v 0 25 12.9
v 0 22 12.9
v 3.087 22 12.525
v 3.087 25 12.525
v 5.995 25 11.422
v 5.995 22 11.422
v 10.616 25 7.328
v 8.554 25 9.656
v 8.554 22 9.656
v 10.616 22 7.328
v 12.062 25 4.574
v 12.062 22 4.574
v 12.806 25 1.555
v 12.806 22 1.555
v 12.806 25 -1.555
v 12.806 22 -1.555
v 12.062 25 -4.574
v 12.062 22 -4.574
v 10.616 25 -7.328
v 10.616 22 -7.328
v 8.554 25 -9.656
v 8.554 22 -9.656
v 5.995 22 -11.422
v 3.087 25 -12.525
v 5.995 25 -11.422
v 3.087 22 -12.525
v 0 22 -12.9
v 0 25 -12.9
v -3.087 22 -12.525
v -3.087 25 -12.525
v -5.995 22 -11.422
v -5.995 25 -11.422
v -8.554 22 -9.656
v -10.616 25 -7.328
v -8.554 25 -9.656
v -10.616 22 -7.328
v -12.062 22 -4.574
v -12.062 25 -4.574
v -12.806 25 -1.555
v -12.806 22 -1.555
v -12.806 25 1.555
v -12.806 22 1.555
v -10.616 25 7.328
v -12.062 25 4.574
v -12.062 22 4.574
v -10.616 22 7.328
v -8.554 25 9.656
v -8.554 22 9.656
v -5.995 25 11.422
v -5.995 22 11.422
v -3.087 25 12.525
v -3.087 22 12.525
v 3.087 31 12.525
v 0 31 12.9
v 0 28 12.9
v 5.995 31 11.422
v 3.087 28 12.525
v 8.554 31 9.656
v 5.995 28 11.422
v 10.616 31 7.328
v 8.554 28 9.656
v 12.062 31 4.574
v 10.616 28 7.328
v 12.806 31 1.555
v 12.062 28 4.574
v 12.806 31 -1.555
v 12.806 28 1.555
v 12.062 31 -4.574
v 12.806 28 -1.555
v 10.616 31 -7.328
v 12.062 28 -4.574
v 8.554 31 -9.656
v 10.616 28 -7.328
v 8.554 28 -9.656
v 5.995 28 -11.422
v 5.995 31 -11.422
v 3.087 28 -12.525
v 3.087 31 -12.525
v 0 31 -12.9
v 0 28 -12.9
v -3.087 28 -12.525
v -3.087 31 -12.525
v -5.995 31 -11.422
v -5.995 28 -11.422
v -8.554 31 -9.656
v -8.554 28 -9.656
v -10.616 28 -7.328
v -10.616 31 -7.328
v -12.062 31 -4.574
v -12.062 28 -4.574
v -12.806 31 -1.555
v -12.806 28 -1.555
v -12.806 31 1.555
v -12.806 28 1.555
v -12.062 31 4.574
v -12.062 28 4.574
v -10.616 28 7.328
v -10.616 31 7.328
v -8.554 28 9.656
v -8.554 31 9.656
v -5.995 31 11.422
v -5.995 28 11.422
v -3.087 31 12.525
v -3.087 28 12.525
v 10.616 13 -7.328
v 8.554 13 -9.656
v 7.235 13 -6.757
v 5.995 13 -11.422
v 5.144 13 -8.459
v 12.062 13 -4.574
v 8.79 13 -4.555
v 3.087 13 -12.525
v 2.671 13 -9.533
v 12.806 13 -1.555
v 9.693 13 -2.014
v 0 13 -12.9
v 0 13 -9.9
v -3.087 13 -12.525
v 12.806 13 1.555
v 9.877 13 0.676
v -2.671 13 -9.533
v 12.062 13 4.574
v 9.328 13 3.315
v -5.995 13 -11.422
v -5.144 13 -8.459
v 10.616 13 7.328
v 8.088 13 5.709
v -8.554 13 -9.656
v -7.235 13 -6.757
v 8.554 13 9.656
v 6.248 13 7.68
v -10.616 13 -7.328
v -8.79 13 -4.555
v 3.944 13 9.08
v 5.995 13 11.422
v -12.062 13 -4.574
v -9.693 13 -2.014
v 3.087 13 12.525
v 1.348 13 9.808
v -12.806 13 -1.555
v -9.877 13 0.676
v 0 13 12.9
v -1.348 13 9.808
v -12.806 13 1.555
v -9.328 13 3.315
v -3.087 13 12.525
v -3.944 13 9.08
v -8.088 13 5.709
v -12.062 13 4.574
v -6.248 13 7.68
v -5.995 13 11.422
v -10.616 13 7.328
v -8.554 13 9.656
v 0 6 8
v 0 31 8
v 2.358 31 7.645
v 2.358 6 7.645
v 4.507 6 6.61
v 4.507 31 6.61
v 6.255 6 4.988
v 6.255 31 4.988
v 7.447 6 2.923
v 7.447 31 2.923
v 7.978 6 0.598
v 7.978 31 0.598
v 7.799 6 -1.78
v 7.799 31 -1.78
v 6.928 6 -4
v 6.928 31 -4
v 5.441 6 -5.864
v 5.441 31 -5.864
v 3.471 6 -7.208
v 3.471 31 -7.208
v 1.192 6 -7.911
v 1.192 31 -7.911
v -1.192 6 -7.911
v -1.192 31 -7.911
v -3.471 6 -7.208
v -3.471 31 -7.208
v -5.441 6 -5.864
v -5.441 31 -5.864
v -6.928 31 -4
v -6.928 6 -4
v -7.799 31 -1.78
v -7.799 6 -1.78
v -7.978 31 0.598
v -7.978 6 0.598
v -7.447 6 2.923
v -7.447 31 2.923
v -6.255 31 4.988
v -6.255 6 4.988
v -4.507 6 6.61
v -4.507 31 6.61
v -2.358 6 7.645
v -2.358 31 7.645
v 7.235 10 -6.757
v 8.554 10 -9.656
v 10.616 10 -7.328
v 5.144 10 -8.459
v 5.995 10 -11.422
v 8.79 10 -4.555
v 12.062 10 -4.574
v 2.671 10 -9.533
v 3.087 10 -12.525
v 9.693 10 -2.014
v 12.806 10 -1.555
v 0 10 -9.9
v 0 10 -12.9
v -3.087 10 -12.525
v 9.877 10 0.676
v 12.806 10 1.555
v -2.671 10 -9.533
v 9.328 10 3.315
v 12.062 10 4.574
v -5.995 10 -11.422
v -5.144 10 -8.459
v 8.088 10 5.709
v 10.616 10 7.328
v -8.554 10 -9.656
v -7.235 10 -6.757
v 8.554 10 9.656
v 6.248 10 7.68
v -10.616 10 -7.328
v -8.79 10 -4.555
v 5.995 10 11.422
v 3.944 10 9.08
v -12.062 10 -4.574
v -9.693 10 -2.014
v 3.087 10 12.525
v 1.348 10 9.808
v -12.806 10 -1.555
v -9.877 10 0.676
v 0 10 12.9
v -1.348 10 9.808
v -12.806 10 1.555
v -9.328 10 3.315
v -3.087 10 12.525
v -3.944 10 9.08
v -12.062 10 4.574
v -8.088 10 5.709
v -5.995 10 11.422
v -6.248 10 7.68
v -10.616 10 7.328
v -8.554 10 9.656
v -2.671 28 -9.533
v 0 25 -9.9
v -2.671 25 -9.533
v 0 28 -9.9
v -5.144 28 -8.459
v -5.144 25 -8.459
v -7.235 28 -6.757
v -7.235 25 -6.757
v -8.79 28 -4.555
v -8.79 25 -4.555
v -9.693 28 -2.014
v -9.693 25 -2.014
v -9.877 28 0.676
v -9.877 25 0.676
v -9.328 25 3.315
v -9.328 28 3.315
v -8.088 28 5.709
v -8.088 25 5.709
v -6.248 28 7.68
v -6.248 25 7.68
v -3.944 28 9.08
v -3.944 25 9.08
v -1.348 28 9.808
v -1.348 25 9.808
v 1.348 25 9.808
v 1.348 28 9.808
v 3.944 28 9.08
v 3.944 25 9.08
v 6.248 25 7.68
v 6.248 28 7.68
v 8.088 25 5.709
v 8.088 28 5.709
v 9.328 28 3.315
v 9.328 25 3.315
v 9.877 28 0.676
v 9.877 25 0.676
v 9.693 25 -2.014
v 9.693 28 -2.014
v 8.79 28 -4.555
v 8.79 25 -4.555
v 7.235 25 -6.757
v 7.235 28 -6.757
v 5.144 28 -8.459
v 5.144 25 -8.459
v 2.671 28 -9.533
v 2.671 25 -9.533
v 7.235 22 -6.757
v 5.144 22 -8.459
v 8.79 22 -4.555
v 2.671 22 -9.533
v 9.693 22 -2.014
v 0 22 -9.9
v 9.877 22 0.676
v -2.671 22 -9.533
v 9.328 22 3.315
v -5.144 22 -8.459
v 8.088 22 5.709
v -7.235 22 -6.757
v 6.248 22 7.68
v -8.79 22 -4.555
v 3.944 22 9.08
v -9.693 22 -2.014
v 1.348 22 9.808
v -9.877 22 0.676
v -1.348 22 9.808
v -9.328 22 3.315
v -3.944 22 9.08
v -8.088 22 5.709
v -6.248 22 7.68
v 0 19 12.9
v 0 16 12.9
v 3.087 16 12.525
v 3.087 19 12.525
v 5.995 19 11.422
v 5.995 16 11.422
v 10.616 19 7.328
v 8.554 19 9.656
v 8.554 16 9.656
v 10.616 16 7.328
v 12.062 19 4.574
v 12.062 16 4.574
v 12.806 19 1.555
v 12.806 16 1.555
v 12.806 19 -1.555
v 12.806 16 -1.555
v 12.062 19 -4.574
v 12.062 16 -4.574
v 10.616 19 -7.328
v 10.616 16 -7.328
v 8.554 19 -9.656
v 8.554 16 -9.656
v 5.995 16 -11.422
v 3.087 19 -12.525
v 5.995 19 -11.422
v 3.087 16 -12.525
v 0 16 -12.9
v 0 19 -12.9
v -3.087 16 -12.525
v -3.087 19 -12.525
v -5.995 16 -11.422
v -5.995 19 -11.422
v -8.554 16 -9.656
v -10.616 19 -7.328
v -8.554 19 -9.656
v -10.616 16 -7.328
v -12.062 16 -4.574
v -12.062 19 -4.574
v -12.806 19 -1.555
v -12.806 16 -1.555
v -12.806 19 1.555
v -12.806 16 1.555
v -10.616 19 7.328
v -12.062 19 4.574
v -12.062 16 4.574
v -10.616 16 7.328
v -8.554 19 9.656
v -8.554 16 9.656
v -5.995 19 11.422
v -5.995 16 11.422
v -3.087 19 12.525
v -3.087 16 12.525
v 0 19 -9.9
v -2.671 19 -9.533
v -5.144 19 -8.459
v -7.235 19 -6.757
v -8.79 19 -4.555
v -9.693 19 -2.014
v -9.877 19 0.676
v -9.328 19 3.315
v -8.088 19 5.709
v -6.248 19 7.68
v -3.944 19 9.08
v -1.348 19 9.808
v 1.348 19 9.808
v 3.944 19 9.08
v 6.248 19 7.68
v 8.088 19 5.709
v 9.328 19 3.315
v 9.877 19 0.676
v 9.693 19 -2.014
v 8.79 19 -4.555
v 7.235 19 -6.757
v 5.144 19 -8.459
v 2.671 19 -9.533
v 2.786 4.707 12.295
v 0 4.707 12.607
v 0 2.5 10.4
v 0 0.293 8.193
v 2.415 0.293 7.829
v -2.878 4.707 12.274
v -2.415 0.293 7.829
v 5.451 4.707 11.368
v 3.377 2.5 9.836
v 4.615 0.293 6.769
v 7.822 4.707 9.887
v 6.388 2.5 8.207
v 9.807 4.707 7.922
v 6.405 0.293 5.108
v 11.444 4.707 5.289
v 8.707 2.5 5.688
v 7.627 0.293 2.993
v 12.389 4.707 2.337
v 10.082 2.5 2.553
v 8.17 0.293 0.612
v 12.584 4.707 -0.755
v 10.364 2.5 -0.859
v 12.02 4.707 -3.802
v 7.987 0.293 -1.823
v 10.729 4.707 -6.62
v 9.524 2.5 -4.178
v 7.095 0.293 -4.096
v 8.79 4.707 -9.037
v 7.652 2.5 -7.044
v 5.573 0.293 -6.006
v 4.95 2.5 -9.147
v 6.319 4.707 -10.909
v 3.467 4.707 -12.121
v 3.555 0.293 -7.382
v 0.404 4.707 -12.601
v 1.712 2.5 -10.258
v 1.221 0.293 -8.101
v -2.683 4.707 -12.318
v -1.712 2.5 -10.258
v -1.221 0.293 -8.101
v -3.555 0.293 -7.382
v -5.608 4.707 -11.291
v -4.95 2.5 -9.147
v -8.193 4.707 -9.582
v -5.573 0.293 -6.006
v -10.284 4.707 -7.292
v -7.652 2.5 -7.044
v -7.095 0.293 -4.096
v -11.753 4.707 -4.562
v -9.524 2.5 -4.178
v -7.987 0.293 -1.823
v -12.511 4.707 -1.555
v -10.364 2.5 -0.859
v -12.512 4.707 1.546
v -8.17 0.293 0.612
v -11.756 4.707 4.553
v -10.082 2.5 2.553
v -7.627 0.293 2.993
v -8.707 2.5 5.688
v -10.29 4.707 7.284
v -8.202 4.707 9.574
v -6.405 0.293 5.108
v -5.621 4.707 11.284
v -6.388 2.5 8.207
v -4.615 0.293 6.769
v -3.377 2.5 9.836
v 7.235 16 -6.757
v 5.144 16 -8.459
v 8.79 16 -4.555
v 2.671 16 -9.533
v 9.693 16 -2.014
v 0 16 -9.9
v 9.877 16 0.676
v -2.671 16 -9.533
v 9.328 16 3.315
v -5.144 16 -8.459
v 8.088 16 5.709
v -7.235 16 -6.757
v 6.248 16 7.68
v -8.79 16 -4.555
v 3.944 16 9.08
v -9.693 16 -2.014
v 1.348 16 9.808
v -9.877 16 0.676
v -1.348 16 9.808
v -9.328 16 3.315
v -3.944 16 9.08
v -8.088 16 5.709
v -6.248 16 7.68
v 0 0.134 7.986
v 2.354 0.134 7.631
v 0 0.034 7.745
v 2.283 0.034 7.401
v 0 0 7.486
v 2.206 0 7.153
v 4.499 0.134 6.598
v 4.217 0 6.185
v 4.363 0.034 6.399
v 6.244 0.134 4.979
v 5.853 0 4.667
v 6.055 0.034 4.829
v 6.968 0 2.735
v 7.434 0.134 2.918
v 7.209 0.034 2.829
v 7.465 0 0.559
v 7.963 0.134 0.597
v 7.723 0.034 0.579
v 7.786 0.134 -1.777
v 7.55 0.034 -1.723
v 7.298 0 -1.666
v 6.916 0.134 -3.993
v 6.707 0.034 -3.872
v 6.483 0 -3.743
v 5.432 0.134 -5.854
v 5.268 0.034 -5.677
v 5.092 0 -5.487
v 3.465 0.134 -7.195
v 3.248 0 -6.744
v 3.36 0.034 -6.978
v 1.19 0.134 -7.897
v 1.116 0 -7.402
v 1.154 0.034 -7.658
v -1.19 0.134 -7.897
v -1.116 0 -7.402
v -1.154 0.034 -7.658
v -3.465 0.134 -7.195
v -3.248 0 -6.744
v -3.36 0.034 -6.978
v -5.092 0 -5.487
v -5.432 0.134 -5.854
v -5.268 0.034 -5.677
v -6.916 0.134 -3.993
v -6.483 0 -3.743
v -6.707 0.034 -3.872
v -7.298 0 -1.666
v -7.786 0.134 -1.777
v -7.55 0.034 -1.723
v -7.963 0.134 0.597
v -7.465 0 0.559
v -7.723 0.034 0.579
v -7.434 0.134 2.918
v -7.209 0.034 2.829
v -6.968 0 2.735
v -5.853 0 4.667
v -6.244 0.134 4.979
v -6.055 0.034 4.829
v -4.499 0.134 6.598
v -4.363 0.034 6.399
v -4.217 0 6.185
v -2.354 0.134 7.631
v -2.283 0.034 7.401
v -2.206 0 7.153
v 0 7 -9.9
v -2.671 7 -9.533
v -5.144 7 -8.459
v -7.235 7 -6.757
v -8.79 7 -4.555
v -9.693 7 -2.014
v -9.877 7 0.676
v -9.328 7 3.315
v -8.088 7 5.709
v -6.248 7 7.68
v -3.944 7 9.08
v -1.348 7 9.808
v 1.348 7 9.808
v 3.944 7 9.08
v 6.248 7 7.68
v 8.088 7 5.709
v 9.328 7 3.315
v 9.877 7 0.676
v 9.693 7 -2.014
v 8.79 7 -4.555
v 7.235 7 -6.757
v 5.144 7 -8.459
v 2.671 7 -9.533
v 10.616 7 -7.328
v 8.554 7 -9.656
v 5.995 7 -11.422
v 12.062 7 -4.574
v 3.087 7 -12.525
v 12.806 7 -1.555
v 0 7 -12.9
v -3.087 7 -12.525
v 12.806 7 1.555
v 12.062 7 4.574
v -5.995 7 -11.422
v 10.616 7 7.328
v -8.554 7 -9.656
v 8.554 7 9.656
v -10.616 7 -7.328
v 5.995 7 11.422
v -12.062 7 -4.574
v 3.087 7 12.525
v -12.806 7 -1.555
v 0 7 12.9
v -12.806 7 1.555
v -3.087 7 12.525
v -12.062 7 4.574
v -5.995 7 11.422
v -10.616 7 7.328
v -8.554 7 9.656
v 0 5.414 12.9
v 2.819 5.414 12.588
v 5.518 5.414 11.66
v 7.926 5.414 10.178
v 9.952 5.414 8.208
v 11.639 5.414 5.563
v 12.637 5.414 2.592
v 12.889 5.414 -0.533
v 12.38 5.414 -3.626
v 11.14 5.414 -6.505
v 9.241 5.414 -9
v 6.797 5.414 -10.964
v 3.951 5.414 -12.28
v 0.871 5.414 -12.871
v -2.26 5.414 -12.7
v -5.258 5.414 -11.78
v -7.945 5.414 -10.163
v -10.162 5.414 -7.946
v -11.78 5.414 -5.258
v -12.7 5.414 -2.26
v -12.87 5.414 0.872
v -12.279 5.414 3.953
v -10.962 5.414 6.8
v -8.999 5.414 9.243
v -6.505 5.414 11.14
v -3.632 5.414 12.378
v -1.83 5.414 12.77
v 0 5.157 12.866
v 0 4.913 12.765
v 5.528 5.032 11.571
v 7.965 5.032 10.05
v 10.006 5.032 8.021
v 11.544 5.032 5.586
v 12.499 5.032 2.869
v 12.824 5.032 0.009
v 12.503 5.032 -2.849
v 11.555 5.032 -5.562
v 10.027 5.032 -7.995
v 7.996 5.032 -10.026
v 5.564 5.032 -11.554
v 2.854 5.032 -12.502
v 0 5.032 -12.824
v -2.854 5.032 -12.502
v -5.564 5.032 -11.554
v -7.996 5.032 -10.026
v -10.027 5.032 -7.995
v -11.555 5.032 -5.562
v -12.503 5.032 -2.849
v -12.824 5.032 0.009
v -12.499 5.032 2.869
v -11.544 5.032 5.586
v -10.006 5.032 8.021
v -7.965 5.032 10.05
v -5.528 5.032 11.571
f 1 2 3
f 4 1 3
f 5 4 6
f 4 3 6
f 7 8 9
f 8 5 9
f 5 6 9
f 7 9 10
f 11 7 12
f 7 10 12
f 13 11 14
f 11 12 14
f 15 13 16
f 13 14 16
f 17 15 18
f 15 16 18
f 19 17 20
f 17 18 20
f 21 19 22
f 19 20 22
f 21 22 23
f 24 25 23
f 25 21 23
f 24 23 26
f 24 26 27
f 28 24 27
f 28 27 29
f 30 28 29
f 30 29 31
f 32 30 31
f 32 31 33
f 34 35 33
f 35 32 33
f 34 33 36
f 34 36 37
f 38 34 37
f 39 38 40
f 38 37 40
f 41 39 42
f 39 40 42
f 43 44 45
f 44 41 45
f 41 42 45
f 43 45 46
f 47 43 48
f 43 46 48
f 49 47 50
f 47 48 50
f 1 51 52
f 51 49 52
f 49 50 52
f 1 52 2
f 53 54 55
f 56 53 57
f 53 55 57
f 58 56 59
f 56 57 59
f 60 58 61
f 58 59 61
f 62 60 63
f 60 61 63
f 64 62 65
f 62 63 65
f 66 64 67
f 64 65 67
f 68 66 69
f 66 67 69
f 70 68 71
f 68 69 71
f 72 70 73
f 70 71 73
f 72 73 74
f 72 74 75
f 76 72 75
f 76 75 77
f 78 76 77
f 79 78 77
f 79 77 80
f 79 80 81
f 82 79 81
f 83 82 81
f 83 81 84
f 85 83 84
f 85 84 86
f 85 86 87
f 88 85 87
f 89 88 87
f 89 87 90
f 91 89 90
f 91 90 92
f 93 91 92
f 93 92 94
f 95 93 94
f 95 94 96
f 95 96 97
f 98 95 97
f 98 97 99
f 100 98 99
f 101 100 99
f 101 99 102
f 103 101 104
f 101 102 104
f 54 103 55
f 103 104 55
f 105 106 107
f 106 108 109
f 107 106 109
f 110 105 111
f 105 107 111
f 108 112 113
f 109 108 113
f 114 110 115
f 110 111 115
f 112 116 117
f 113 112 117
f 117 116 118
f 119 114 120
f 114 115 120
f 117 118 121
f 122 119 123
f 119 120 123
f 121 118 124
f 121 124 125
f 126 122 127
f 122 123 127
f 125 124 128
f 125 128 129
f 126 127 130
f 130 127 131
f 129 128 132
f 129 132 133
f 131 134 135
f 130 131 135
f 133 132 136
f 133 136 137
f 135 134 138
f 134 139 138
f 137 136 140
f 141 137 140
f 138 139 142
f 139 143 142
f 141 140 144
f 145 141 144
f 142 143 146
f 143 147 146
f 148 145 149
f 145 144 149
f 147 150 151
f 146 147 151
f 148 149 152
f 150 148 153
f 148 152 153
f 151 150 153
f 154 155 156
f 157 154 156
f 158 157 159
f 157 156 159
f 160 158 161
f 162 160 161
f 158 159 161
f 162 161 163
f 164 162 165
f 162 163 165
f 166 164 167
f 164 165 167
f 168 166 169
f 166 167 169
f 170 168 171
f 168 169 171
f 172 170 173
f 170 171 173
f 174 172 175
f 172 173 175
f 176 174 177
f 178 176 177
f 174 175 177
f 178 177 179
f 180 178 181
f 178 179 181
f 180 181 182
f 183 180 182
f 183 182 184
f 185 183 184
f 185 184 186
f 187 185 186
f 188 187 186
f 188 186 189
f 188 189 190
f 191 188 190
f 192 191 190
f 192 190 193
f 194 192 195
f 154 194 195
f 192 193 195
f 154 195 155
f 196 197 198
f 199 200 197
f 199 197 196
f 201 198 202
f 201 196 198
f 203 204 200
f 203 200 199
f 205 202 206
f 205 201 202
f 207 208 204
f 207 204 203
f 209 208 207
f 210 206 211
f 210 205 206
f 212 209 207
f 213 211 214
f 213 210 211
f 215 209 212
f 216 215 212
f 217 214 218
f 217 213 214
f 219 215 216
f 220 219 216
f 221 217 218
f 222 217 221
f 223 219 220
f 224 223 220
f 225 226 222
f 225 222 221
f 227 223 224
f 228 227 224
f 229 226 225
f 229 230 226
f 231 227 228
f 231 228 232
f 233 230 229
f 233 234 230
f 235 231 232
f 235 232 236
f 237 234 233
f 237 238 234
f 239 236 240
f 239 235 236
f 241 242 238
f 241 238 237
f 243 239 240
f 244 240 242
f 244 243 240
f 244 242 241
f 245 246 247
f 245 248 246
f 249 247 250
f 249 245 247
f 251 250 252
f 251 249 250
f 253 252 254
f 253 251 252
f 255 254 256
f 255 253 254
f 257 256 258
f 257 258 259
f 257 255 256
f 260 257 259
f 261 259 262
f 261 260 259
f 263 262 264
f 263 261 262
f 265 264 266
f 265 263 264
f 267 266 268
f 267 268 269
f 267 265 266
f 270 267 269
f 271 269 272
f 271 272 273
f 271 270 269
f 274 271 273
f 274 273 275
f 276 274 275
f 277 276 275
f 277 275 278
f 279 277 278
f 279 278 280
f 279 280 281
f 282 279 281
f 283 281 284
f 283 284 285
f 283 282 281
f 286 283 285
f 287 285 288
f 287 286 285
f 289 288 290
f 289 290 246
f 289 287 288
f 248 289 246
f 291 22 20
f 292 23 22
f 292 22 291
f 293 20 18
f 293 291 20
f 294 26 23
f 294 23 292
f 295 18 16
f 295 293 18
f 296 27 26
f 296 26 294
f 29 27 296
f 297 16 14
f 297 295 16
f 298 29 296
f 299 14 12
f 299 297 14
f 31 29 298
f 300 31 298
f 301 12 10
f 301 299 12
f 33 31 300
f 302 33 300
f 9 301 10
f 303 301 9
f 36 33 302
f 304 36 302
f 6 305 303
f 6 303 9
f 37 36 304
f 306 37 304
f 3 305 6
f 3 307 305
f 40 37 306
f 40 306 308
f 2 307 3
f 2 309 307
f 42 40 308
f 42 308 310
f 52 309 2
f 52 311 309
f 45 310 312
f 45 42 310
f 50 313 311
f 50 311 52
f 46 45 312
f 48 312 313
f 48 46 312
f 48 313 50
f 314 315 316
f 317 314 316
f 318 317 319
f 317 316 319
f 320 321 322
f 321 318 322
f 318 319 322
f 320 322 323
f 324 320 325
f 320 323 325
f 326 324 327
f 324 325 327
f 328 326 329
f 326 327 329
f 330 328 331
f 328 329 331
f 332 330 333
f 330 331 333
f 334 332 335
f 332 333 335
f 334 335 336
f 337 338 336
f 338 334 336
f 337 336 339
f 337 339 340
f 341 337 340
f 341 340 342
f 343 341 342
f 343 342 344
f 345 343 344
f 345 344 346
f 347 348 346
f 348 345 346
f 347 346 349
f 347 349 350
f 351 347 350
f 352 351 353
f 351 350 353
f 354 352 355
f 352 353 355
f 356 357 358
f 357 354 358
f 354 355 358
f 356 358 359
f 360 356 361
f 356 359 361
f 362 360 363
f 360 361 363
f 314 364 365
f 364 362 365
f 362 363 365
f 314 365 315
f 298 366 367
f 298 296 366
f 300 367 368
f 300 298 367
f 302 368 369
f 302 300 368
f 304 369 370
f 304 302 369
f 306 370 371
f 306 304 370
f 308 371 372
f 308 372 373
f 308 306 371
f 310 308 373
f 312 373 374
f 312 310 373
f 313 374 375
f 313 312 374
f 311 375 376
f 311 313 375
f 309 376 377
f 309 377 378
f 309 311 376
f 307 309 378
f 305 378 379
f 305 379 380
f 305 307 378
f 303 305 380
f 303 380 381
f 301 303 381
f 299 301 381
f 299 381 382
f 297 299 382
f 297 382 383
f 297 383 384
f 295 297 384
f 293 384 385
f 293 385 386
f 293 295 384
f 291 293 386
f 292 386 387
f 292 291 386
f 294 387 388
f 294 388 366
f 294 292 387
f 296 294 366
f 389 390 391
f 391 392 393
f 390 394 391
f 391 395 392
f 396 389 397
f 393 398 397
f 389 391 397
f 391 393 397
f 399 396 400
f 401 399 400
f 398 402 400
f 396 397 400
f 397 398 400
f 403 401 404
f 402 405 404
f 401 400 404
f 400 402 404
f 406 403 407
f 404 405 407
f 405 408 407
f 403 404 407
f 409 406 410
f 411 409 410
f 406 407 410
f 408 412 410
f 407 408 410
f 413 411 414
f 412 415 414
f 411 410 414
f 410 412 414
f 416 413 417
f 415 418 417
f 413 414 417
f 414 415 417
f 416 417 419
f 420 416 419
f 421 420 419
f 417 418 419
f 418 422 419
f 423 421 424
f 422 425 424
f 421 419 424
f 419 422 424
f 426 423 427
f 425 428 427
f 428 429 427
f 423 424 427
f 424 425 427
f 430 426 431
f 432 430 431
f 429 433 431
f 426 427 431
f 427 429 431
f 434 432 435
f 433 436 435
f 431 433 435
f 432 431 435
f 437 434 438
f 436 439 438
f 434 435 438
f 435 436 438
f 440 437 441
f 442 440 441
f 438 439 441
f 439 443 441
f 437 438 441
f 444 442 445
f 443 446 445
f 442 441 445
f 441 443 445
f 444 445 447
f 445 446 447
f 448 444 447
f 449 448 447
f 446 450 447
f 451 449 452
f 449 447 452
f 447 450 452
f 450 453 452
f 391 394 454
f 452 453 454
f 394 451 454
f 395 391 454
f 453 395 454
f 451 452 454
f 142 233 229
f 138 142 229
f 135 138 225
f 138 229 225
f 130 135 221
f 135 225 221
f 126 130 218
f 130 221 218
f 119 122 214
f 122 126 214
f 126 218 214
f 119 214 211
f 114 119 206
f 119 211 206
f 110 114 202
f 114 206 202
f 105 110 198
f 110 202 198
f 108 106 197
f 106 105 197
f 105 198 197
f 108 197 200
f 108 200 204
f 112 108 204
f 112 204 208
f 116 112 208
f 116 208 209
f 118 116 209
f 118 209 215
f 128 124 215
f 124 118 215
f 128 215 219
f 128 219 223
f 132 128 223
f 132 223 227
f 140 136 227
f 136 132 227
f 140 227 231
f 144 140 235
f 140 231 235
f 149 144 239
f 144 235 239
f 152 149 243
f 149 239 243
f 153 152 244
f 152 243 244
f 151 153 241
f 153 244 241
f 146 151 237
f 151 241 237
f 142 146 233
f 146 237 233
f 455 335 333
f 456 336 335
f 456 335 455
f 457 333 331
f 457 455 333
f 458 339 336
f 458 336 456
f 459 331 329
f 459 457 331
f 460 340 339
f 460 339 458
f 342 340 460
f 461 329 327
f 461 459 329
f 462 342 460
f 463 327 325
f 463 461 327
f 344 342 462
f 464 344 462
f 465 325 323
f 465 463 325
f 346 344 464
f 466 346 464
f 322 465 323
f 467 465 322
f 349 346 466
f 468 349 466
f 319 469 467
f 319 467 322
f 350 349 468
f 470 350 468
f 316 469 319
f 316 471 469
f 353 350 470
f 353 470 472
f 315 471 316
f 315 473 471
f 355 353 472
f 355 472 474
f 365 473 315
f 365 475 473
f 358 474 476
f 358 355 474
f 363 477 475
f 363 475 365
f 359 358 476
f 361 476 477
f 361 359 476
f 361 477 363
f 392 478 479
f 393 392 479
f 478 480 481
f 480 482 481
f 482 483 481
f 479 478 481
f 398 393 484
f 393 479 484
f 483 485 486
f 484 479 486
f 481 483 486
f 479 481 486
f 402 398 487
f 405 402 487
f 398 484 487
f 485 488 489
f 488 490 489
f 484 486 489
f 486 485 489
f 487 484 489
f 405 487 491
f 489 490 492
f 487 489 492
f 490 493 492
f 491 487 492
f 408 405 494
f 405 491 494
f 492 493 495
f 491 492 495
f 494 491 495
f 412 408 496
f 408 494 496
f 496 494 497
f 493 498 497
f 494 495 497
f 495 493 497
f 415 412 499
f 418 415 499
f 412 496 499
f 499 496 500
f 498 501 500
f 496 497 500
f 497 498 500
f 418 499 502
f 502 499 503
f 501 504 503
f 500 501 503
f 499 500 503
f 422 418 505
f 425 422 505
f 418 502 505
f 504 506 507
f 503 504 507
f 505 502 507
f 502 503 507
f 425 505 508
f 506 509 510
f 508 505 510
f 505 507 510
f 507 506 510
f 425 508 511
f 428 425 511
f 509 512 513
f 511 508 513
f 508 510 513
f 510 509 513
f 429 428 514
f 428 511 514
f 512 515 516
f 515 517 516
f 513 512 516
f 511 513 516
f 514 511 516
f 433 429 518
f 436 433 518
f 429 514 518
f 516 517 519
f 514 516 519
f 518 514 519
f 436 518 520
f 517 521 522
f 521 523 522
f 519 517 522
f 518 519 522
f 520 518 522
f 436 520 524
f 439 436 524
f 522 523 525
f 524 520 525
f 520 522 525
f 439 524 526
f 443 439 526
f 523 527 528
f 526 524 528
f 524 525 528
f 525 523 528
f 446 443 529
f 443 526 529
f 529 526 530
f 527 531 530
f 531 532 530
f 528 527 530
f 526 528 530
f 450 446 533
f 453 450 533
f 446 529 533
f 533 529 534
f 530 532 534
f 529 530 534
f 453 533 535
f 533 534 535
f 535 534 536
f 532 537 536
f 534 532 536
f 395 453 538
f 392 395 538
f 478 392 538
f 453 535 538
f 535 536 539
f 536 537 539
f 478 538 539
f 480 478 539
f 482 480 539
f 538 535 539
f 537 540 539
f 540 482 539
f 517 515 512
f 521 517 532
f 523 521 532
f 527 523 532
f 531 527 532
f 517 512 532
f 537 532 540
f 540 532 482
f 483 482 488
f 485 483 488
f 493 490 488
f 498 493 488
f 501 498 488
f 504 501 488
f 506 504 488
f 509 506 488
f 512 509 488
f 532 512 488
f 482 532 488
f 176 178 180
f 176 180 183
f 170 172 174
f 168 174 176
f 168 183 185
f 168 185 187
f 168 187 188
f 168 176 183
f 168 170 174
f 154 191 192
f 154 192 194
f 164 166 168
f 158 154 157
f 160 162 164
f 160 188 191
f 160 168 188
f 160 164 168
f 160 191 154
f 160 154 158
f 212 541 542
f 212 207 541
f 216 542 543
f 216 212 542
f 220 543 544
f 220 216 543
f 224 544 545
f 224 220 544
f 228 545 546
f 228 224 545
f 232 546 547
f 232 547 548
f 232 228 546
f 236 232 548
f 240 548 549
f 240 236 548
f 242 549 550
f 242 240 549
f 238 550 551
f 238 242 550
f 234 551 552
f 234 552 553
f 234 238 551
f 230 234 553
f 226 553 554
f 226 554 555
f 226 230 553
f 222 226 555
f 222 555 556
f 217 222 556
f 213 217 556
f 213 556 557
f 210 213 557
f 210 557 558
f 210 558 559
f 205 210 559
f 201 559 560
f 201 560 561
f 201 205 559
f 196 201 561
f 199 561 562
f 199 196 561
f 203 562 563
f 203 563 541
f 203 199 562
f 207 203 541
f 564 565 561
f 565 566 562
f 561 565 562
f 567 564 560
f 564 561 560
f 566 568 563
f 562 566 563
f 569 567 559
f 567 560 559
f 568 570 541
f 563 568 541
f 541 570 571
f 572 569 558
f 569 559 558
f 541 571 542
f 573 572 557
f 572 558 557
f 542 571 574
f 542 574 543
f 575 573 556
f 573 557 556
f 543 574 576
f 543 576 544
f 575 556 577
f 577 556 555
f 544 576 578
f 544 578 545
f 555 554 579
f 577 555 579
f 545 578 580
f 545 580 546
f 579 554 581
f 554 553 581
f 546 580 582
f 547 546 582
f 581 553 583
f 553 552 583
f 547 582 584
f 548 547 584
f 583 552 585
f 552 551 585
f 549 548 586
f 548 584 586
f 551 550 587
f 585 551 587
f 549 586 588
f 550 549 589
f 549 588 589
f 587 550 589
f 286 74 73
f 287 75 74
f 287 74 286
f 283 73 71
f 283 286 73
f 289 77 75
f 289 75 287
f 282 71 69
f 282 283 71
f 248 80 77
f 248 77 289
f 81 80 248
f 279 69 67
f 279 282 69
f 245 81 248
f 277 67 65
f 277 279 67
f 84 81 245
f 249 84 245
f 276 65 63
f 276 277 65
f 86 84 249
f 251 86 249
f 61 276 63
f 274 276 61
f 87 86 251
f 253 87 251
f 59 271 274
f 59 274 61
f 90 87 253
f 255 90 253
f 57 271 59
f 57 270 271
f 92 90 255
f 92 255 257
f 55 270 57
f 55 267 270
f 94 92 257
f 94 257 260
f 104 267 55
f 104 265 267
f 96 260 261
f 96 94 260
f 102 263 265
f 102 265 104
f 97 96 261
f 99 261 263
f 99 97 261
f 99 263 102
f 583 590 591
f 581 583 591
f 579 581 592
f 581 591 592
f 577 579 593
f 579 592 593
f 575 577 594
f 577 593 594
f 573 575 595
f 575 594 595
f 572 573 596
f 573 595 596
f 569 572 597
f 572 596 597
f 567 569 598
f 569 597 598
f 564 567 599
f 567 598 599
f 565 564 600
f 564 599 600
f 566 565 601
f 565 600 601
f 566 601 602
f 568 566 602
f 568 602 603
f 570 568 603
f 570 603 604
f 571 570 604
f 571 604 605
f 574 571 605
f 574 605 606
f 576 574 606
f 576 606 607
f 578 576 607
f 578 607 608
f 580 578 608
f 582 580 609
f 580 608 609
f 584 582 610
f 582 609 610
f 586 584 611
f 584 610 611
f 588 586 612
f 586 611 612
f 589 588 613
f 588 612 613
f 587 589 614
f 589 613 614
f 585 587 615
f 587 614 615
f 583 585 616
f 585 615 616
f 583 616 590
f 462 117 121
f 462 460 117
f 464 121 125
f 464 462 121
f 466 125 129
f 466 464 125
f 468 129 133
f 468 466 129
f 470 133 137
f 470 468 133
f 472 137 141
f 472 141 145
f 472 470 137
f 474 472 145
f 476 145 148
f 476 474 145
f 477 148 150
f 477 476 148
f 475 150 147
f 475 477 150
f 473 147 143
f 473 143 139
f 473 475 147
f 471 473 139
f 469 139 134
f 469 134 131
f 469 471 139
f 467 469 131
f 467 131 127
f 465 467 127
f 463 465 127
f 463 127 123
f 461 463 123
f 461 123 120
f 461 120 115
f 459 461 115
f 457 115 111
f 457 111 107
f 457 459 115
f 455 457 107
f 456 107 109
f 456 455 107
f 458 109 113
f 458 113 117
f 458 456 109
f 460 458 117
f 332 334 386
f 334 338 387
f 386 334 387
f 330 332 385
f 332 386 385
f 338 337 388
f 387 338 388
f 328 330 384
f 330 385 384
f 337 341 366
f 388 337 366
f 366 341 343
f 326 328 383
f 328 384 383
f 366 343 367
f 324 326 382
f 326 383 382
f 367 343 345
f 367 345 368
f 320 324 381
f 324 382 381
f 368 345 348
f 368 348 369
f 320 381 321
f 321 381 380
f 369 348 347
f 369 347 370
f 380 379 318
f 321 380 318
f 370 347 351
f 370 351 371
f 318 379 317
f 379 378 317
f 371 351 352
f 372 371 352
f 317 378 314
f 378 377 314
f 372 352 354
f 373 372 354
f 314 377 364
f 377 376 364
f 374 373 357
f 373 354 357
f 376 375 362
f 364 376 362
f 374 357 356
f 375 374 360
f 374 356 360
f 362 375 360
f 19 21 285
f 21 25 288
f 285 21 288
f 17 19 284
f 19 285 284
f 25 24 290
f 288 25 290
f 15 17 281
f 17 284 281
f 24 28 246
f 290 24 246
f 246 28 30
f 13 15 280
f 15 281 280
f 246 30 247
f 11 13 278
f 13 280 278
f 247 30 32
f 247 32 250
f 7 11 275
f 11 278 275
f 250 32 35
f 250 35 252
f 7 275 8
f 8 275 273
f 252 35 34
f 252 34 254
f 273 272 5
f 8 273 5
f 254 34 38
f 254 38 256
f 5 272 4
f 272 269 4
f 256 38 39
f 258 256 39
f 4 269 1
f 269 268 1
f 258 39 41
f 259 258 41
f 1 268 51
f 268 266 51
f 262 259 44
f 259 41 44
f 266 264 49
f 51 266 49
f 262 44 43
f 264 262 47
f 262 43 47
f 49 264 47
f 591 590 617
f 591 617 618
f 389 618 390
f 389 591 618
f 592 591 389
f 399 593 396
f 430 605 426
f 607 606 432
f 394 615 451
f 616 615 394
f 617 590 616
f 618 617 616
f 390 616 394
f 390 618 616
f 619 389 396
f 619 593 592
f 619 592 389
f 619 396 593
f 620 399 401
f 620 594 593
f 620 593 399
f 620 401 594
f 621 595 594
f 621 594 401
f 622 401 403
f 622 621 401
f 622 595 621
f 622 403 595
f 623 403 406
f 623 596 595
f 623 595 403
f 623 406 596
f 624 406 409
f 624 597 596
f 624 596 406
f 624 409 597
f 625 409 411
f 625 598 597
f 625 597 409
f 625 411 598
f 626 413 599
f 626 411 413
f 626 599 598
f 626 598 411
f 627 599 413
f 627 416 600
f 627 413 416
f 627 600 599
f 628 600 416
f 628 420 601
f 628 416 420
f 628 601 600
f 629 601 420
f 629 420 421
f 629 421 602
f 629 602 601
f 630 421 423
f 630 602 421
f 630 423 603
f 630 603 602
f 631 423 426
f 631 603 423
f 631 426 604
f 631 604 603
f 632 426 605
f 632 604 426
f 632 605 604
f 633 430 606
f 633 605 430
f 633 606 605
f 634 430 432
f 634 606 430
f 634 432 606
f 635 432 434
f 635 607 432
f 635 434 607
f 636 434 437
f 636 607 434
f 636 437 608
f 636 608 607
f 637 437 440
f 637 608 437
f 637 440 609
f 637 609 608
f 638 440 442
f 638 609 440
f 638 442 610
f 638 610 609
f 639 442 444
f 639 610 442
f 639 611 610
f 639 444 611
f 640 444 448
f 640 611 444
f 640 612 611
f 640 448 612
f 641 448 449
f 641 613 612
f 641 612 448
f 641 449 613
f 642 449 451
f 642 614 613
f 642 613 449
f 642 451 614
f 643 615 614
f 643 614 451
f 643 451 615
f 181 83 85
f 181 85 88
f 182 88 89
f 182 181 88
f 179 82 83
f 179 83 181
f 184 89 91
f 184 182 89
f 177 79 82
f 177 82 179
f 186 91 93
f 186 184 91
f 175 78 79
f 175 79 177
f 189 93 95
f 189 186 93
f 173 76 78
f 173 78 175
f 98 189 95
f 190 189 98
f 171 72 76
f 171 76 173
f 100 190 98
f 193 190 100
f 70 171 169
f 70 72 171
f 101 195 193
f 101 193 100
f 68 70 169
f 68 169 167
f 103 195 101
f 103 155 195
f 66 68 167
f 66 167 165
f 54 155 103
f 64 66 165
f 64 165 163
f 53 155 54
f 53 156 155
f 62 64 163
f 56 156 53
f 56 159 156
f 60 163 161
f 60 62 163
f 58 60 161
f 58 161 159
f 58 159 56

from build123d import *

# Parameters (mm, degrees)
SKETCH_1_R          = 12.9
EXTRUDE_1_DEPTH     = 31
SKETCH_2_R          = 8
CUT_EXTRUDE_1_DEPTH = 25
CHAMFER_1_SIZE      = 5
FILLET_1_R          = 1
SKETCH_3_W          = 3
SKETCH_3_H          = 3


with BuildPart() as part:
    # 草图1 → 凸台-拉伸1 (new body)
    with BuildSketch(Plane(origin=(0, 0, 0), x_dir=(1, 0, 0), z_dir=(0, 1, 0))):
        with Locations(Location((0, 0, 0), (0, 0, 270))):
            Circle(SKETCH_1_R)
    extrude(amount=EXTRUDE_1_DEPTH)

    # 草图2 → 切除-拉伸1 (cut)
    with BuildSketch(Plane(origin=(0, 31, 0), x_dir=(1, 0, 0), z_dir=(0, 1, 0))):
        with Locations(Location((0, 0, 0), (0, 0, 270))):
            Circle(SKETCH_2_R)
    extrude(amount=-CUT_EXTRUDE_1_DEPTH, mode=Mode.SUBTRACT)

    # 倒角1
    chamfer_1_edges = [part.edges().sort_by_distance(p)[0] for p in [
        (0, 0, -12.9),
    ]]
    chamfer(chamfer_1_edges, length=CHAMFER_1_SIZE)

    # 圆角1
    fillet_1_edges = [part.edges().sort_by_distance(p)[0] for p in [
        (0, 0, -7.9),
        (0, 5, -12.9),
    ]]
    fillet(fillet_1_edges, radius=FILLET_1_R)

    # 草图3 → 切除-旋转1 (revolve, cut)
    with BuildSketch(Plane.XY, mode=Mode.PRIVATE) as cut_revolve_1_sk:
        with Locations((11.4, 26.5)):
            Rectangle(SKETCH_3_W, SKETCH_3_H)
        with Locations((11.4, 20.5)):
            Rectangle(SKETCH_3_W, SKETCH_3_H)
        with Locations((11.4, 14.5)):
            Rectangle(SKETCH_3_W, SKETCH_3_H)
        with Locations((11.4, 8.5)):
            Rectangle(SKETCH_3_W, SKETCH_3_H)
    revolve(cut_revolve_1_sk.sketch.rotate(Axis((0, 0, 0), (0, 1, 0)), 90), axis=Axis((0, 0, 0), (0, 1, 0)), mode=Mode.SUBTRACT)


solid = part.part
